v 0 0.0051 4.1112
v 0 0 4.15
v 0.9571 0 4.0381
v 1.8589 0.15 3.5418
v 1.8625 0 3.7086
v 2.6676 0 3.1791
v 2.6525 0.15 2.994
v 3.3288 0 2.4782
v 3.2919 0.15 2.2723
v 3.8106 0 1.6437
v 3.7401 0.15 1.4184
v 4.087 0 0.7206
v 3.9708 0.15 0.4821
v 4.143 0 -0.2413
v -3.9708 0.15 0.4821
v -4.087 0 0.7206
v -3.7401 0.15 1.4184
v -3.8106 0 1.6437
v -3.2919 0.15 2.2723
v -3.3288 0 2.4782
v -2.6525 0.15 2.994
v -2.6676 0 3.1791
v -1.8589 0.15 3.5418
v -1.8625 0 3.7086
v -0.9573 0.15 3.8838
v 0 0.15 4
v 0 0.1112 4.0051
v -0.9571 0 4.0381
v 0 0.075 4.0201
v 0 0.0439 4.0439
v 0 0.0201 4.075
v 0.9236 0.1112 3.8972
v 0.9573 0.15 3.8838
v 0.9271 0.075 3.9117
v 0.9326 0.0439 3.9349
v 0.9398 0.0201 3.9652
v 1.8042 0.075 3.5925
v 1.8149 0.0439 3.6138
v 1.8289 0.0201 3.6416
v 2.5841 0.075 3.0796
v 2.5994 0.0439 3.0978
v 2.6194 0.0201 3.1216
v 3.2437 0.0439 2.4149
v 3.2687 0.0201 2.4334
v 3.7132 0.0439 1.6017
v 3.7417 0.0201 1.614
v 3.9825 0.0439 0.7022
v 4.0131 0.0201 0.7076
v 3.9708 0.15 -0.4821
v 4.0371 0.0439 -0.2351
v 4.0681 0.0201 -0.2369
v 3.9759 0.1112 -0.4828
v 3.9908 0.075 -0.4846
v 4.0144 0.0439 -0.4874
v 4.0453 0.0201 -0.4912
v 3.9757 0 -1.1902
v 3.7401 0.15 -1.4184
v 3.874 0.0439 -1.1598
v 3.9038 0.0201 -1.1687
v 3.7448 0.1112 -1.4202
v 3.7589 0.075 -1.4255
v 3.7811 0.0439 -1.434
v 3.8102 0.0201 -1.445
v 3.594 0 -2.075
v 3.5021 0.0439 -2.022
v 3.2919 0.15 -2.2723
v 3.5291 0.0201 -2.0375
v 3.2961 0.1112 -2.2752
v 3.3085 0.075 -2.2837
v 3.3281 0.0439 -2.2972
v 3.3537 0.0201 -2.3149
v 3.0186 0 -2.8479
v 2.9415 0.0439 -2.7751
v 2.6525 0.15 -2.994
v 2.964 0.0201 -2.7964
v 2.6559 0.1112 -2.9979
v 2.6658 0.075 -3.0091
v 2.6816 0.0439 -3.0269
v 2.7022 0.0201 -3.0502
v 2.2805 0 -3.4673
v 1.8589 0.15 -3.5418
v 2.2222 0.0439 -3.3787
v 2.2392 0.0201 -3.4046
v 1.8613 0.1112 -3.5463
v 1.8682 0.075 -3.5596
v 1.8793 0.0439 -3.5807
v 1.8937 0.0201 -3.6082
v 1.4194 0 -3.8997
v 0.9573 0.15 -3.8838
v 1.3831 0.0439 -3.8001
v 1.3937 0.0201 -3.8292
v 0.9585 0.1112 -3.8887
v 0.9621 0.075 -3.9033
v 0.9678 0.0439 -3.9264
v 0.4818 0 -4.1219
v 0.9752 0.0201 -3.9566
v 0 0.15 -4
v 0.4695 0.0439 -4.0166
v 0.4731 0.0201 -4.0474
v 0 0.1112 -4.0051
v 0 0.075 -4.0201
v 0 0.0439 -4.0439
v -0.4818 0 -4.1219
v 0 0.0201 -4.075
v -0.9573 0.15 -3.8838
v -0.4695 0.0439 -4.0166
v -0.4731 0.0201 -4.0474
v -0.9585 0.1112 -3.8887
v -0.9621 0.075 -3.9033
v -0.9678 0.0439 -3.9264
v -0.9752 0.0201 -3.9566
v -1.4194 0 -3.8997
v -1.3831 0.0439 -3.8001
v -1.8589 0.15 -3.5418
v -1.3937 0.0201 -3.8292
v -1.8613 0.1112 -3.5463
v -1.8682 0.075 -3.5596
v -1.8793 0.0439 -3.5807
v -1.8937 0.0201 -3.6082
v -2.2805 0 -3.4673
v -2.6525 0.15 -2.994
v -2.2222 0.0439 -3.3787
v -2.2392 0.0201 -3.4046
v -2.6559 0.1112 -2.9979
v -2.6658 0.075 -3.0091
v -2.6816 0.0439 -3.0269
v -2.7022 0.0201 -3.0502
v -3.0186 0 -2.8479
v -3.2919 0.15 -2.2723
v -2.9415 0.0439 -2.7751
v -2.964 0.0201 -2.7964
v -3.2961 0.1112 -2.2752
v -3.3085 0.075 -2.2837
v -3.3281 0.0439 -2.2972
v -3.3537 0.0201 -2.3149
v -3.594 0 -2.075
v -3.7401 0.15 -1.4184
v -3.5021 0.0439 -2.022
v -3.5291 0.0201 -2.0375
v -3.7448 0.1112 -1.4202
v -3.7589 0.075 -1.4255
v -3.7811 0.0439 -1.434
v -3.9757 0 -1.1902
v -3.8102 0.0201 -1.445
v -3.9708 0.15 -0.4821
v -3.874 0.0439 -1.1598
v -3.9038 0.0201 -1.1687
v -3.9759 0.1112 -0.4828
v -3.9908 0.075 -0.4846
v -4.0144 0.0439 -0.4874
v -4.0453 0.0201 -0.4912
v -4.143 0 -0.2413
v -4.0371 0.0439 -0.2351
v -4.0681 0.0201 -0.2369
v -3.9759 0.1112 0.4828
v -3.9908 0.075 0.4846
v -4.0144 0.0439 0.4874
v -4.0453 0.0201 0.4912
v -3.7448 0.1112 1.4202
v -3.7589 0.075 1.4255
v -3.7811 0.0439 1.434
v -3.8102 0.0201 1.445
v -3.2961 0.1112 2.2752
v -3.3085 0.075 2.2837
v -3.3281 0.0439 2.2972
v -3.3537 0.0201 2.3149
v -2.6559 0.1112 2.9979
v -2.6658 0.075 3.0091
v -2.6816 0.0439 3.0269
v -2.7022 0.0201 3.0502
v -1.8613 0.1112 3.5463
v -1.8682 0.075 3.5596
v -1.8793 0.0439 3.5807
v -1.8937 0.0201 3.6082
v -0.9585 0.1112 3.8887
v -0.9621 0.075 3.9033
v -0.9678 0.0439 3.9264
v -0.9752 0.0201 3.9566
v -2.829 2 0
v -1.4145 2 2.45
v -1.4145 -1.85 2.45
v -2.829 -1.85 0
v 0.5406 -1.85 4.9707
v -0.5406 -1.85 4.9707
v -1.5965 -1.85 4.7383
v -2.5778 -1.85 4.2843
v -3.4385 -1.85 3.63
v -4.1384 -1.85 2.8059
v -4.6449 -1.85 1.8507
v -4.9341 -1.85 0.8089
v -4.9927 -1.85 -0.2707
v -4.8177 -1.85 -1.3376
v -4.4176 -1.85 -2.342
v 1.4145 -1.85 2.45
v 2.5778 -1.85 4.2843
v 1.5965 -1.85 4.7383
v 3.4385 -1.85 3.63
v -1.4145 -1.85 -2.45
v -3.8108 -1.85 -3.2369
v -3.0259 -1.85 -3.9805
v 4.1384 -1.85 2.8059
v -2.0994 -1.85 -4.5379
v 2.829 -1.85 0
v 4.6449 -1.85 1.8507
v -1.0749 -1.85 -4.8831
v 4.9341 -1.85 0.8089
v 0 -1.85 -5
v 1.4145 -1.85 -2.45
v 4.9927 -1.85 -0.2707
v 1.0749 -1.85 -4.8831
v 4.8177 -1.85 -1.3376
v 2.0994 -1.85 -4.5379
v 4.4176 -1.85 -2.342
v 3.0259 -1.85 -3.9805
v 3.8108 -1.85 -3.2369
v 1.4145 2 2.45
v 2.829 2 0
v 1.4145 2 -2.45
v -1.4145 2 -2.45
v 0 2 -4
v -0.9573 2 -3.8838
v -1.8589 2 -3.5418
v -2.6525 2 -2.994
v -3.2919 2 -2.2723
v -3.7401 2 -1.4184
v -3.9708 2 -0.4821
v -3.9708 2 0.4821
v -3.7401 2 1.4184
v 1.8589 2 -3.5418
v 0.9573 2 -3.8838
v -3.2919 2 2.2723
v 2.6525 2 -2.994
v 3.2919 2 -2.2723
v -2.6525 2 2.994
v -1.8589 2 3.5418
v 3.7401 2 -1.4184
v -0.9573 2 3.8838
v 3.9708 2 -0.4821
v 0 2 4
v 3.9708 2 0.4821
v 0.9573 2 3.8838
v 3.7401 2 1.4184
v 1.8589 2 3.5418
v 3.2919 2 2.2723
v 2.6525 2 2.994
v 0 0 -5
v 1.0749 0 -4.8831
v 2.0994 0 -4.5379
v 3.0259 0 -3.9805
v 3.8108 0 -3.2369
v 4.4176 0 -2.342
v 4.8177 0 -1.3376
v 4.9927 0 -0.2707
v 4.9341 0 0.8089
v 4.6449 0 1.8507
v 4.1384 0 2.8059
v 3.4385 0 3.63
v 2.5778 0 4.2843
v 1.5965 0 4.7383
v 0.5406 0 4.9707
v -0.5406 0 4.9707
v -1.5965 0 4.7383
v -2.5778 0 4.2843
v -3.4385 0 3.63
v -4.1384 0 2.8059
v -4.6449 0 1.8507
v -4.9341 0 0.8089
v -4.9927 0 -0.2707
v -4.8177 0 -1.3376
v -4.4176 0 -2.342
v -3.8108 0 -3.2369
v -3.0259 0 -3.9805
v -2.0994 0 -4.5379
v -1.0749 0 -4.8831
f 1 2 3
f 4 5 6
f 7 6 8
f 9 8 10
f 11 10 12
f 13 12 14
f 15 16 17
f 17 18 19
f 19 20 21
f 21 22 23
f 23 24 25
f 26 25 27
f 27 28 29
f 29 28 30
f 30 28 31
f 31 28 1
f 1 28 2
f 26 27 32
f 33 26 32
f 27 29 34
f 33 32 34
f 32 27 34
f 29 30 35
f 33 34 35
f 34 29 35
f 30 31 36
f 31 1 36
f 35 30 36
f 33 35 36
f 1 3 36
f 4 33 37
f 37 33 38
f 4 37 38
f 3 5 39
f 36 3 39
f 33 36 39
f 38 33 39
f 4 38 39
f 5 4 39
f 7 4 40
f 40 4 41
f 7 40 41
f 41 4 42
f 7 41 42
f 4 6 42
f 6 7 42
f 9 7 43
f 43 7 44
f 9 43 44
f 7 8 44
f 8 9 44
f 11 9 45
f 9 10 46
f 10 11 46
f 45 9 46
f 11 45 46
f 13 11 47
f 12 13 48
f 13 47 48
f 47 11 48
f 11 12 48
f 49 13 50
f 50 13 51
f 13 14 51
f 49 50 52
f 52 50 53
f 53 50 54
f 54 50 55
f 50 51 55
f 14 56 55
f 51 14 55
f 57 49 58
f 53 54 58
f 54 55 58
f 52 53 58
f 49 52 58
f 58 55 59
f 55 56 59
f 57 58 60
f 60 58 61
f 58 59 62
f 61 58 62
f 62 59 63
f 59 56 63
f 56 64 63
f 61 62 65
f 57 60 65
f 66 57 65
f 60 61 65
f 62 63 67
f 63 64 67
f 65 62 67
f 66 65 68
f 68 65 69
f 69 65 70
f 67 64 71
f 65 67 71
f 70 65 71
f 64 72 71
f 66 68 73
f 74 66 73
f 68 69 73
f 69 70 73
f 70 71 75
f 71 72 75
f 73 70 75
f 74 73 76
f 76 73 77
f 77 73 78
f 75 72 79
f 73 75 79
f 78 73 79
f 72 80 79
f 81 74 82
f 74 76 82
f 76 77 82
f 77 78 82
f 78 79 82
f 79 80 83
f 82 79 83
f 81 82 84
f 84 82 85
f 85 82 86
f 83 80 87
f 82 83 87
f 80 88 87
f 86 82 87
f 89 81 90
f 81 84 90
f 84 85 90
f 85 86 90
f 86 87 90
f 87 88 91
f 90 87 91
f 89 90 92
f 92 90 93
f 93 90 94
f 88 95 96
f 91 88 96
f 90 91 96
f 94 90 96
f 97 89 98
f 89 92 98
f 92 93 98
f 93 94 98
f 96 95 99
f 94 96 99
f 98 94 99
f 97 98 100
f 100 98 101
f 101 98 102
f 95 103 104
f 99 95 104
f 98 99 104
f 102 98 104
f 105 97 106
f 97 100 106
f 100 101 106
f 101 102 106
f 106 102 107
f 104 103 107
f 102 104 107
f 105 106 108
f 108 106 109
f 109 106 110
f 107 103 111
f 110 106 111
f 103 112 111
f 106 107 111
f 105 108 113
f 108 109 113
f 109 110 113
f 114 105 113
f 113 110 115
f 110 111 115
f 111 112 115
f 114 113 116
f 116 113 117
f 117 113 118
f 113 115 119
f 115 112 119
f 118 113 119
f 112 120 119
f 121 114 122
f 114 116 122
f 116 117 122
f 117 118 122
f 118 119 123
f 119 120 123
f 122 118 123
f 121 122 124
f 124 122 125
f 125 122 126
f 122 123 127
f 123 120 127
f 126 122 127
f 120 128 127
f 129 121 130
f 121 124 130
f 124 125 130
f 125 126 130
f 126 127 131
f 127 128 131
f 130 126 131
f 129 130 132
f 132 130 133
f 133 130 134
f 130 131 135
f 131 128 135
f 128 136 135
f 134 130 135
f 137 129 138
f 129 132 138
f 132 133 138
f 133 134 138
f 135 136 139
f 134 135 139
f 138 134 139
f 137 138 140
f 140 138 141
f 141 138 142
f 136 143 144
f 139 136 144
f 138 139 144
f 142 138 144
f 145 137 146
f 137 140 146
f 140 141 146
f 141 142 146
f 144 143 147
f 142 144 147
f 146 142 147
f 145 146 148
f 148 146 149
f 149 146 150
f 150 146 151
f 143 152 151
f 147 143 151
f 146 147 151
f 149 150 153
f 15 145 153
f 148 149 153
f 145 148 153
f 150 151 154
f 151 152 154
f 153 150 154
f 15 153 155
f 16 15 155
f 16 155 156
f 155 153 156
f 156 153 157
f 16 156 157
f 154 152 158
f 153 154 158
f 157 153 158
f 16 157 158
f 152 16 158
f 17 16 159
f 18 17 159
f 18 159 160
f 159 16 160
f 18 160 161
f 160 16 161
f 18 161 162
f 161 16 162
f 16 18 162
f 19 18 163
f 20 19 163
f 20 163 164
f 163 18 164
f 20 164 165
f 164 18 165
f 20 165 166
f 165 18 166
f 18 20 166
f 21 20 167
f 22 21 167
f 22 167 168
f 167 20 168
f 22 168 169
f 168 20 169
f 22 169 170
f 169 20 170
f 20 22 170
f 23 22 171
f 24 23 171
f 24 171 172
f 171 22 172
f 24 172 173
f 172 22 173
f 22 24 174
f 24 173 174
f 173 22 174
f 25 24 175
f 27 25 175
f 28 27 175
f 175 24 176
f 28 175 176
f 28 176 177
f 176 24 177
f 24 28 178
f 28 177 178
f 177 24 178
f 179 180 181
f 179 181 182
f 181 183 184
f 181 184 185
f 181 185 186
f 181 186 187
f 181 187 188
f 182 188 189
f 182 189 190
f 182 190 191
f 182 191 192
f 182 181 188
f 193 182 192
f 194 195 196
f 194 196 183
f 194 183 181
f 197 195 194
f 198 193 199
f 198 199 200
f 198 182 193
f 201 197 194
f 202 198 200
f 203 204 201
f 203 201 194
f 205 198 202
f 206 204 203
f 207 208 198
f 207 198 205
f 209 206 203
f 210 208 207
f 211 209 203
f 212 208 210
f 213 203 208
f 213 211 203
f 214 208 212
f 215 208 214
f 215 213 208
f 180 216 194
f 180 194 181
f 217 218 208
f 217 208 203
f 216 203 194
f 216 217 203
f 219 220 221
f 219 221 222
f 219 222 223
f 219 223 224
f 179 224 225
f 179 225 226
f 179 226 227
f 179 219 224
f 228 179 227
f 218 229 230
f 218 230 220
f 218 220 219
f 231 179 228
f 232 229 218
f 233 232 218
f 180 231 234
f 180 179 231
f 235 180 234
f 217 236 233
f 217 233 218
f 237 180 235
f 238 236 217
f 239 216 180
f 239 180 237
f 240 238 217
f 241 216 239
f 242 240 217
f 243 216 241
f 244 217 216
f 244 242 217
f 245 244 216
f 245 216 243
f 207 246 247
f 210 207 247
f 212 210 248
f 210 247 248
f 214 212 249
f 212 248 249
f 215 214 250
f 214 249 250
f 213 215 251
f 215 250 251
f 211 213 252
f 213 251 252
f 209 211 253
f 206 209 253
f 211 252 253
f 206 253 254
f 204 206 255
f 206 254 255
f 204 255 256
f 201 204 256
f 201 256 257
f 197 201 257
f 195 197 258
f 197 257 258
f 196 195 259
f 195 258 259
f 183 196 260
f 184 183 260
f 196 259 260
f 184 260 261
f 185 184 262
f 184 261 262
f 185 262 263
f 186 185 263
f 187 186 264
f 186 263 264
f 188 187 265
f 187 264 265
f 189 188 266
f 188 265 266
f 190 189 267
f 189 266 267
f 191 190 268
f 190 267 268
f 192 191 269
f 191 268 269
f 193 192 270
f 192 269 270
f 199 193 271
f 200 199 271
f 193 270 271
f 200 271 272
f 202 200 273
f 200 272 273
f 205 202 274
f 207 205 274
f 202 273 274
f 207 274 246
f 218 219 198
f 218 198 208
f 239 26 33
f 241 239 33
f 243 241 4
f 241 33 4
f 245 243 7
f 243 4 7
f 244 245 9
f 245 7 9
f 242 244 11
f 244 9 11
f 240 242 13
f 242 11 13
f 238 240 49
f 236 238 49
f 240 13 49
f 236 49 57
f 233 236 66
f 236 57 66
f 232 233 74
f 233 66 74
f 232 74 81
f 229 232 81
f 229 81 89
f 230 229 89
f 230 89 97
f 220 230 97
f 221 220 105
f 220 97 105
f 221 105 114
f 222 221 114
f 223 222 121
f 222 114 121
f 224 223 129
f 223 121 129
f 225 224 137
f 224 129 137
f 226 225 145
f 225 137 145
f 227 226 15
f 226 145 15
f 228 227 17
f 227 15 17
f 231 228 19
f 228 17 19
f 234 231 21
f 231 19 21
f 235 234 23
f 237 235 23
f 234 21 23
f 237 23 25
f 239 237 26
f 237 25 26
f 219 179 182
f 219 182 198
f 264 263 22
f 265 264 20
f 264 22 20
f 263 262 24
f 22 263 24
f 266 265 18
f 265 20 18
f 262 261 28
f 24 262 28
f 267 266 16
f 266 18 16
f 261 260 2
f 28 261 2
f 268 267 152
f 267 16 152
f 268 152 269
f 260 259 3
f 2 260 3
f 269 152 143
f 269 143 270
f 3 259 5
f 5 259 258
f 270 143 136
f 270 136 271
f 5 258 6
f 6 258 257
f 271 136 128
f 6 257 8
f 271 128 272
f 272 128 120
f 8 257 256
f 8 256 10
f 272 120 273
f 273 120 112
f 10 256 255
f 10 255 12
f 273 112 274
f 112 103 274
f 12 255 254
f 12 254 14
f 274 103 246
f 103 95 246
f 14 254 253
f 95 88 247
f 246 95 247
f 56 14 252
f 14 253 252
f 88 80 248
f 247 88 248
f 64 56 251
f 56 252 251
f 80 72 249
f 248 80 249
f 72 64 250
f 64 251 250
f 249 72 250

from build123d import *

# Parameters (mm, degrees)
SKETCH1_R           = 4
BOSS_EXTRUDE1_DEPTH = 2
SKETCH2_R           = 5
BOSS_EXTRUDE2_DEPTH = 1.85
FILLET1_R           = 0.15


with BuildPart() as part:
    # Sketch1 → Boss-Extrude1 (new body)
    with BuildSketch(Plane(origin=(0, 0, 0), x_dir=(1, 0, 0), z_dir=(0, 1, 0))):
        with Locations(Location((0, 0, 0), (0, 0, 270))):
            Circle(SKETCH1_R)
        Polygon((2.829016319, 0), (1.41450816, 2.45), (-1.41450816, 2.45), (-2.829016319, 0), (-1.41450816, -2.45), (1.41450816, -2.45), align=None, mode=Mode.SUBTRACT)
    extrude(amount=BOSS_EXTRUDE1_DEPTH)

    # Sketch2 → Boss-Extrude2 (add)
    with BuildSketch(Plane.XZ):
        with Locations(Location((0, 0, 0), (0, 0, 270))):
            Circle(SKETCH2_R)
        Polygon((2.829016319, 0), (1.41450816, 2.45), (-1.41450816, 2.45), (-2.829016319, 0), (-1.41450816, -2.45), (1.41450816, -2.45), align=None, mode=Mode.SUBTRACT)
    extrude(amount=BOSS_EXTRUDE2_DEPTH)

    # Fillet1
    fillet1_edges = [part.edges().sort_by_distance(p)[0] for p in [
        (0, 0, -4),
    ]]
    fillet(fillet1_edges, radius=FILLET1_R)


solid = part.part
